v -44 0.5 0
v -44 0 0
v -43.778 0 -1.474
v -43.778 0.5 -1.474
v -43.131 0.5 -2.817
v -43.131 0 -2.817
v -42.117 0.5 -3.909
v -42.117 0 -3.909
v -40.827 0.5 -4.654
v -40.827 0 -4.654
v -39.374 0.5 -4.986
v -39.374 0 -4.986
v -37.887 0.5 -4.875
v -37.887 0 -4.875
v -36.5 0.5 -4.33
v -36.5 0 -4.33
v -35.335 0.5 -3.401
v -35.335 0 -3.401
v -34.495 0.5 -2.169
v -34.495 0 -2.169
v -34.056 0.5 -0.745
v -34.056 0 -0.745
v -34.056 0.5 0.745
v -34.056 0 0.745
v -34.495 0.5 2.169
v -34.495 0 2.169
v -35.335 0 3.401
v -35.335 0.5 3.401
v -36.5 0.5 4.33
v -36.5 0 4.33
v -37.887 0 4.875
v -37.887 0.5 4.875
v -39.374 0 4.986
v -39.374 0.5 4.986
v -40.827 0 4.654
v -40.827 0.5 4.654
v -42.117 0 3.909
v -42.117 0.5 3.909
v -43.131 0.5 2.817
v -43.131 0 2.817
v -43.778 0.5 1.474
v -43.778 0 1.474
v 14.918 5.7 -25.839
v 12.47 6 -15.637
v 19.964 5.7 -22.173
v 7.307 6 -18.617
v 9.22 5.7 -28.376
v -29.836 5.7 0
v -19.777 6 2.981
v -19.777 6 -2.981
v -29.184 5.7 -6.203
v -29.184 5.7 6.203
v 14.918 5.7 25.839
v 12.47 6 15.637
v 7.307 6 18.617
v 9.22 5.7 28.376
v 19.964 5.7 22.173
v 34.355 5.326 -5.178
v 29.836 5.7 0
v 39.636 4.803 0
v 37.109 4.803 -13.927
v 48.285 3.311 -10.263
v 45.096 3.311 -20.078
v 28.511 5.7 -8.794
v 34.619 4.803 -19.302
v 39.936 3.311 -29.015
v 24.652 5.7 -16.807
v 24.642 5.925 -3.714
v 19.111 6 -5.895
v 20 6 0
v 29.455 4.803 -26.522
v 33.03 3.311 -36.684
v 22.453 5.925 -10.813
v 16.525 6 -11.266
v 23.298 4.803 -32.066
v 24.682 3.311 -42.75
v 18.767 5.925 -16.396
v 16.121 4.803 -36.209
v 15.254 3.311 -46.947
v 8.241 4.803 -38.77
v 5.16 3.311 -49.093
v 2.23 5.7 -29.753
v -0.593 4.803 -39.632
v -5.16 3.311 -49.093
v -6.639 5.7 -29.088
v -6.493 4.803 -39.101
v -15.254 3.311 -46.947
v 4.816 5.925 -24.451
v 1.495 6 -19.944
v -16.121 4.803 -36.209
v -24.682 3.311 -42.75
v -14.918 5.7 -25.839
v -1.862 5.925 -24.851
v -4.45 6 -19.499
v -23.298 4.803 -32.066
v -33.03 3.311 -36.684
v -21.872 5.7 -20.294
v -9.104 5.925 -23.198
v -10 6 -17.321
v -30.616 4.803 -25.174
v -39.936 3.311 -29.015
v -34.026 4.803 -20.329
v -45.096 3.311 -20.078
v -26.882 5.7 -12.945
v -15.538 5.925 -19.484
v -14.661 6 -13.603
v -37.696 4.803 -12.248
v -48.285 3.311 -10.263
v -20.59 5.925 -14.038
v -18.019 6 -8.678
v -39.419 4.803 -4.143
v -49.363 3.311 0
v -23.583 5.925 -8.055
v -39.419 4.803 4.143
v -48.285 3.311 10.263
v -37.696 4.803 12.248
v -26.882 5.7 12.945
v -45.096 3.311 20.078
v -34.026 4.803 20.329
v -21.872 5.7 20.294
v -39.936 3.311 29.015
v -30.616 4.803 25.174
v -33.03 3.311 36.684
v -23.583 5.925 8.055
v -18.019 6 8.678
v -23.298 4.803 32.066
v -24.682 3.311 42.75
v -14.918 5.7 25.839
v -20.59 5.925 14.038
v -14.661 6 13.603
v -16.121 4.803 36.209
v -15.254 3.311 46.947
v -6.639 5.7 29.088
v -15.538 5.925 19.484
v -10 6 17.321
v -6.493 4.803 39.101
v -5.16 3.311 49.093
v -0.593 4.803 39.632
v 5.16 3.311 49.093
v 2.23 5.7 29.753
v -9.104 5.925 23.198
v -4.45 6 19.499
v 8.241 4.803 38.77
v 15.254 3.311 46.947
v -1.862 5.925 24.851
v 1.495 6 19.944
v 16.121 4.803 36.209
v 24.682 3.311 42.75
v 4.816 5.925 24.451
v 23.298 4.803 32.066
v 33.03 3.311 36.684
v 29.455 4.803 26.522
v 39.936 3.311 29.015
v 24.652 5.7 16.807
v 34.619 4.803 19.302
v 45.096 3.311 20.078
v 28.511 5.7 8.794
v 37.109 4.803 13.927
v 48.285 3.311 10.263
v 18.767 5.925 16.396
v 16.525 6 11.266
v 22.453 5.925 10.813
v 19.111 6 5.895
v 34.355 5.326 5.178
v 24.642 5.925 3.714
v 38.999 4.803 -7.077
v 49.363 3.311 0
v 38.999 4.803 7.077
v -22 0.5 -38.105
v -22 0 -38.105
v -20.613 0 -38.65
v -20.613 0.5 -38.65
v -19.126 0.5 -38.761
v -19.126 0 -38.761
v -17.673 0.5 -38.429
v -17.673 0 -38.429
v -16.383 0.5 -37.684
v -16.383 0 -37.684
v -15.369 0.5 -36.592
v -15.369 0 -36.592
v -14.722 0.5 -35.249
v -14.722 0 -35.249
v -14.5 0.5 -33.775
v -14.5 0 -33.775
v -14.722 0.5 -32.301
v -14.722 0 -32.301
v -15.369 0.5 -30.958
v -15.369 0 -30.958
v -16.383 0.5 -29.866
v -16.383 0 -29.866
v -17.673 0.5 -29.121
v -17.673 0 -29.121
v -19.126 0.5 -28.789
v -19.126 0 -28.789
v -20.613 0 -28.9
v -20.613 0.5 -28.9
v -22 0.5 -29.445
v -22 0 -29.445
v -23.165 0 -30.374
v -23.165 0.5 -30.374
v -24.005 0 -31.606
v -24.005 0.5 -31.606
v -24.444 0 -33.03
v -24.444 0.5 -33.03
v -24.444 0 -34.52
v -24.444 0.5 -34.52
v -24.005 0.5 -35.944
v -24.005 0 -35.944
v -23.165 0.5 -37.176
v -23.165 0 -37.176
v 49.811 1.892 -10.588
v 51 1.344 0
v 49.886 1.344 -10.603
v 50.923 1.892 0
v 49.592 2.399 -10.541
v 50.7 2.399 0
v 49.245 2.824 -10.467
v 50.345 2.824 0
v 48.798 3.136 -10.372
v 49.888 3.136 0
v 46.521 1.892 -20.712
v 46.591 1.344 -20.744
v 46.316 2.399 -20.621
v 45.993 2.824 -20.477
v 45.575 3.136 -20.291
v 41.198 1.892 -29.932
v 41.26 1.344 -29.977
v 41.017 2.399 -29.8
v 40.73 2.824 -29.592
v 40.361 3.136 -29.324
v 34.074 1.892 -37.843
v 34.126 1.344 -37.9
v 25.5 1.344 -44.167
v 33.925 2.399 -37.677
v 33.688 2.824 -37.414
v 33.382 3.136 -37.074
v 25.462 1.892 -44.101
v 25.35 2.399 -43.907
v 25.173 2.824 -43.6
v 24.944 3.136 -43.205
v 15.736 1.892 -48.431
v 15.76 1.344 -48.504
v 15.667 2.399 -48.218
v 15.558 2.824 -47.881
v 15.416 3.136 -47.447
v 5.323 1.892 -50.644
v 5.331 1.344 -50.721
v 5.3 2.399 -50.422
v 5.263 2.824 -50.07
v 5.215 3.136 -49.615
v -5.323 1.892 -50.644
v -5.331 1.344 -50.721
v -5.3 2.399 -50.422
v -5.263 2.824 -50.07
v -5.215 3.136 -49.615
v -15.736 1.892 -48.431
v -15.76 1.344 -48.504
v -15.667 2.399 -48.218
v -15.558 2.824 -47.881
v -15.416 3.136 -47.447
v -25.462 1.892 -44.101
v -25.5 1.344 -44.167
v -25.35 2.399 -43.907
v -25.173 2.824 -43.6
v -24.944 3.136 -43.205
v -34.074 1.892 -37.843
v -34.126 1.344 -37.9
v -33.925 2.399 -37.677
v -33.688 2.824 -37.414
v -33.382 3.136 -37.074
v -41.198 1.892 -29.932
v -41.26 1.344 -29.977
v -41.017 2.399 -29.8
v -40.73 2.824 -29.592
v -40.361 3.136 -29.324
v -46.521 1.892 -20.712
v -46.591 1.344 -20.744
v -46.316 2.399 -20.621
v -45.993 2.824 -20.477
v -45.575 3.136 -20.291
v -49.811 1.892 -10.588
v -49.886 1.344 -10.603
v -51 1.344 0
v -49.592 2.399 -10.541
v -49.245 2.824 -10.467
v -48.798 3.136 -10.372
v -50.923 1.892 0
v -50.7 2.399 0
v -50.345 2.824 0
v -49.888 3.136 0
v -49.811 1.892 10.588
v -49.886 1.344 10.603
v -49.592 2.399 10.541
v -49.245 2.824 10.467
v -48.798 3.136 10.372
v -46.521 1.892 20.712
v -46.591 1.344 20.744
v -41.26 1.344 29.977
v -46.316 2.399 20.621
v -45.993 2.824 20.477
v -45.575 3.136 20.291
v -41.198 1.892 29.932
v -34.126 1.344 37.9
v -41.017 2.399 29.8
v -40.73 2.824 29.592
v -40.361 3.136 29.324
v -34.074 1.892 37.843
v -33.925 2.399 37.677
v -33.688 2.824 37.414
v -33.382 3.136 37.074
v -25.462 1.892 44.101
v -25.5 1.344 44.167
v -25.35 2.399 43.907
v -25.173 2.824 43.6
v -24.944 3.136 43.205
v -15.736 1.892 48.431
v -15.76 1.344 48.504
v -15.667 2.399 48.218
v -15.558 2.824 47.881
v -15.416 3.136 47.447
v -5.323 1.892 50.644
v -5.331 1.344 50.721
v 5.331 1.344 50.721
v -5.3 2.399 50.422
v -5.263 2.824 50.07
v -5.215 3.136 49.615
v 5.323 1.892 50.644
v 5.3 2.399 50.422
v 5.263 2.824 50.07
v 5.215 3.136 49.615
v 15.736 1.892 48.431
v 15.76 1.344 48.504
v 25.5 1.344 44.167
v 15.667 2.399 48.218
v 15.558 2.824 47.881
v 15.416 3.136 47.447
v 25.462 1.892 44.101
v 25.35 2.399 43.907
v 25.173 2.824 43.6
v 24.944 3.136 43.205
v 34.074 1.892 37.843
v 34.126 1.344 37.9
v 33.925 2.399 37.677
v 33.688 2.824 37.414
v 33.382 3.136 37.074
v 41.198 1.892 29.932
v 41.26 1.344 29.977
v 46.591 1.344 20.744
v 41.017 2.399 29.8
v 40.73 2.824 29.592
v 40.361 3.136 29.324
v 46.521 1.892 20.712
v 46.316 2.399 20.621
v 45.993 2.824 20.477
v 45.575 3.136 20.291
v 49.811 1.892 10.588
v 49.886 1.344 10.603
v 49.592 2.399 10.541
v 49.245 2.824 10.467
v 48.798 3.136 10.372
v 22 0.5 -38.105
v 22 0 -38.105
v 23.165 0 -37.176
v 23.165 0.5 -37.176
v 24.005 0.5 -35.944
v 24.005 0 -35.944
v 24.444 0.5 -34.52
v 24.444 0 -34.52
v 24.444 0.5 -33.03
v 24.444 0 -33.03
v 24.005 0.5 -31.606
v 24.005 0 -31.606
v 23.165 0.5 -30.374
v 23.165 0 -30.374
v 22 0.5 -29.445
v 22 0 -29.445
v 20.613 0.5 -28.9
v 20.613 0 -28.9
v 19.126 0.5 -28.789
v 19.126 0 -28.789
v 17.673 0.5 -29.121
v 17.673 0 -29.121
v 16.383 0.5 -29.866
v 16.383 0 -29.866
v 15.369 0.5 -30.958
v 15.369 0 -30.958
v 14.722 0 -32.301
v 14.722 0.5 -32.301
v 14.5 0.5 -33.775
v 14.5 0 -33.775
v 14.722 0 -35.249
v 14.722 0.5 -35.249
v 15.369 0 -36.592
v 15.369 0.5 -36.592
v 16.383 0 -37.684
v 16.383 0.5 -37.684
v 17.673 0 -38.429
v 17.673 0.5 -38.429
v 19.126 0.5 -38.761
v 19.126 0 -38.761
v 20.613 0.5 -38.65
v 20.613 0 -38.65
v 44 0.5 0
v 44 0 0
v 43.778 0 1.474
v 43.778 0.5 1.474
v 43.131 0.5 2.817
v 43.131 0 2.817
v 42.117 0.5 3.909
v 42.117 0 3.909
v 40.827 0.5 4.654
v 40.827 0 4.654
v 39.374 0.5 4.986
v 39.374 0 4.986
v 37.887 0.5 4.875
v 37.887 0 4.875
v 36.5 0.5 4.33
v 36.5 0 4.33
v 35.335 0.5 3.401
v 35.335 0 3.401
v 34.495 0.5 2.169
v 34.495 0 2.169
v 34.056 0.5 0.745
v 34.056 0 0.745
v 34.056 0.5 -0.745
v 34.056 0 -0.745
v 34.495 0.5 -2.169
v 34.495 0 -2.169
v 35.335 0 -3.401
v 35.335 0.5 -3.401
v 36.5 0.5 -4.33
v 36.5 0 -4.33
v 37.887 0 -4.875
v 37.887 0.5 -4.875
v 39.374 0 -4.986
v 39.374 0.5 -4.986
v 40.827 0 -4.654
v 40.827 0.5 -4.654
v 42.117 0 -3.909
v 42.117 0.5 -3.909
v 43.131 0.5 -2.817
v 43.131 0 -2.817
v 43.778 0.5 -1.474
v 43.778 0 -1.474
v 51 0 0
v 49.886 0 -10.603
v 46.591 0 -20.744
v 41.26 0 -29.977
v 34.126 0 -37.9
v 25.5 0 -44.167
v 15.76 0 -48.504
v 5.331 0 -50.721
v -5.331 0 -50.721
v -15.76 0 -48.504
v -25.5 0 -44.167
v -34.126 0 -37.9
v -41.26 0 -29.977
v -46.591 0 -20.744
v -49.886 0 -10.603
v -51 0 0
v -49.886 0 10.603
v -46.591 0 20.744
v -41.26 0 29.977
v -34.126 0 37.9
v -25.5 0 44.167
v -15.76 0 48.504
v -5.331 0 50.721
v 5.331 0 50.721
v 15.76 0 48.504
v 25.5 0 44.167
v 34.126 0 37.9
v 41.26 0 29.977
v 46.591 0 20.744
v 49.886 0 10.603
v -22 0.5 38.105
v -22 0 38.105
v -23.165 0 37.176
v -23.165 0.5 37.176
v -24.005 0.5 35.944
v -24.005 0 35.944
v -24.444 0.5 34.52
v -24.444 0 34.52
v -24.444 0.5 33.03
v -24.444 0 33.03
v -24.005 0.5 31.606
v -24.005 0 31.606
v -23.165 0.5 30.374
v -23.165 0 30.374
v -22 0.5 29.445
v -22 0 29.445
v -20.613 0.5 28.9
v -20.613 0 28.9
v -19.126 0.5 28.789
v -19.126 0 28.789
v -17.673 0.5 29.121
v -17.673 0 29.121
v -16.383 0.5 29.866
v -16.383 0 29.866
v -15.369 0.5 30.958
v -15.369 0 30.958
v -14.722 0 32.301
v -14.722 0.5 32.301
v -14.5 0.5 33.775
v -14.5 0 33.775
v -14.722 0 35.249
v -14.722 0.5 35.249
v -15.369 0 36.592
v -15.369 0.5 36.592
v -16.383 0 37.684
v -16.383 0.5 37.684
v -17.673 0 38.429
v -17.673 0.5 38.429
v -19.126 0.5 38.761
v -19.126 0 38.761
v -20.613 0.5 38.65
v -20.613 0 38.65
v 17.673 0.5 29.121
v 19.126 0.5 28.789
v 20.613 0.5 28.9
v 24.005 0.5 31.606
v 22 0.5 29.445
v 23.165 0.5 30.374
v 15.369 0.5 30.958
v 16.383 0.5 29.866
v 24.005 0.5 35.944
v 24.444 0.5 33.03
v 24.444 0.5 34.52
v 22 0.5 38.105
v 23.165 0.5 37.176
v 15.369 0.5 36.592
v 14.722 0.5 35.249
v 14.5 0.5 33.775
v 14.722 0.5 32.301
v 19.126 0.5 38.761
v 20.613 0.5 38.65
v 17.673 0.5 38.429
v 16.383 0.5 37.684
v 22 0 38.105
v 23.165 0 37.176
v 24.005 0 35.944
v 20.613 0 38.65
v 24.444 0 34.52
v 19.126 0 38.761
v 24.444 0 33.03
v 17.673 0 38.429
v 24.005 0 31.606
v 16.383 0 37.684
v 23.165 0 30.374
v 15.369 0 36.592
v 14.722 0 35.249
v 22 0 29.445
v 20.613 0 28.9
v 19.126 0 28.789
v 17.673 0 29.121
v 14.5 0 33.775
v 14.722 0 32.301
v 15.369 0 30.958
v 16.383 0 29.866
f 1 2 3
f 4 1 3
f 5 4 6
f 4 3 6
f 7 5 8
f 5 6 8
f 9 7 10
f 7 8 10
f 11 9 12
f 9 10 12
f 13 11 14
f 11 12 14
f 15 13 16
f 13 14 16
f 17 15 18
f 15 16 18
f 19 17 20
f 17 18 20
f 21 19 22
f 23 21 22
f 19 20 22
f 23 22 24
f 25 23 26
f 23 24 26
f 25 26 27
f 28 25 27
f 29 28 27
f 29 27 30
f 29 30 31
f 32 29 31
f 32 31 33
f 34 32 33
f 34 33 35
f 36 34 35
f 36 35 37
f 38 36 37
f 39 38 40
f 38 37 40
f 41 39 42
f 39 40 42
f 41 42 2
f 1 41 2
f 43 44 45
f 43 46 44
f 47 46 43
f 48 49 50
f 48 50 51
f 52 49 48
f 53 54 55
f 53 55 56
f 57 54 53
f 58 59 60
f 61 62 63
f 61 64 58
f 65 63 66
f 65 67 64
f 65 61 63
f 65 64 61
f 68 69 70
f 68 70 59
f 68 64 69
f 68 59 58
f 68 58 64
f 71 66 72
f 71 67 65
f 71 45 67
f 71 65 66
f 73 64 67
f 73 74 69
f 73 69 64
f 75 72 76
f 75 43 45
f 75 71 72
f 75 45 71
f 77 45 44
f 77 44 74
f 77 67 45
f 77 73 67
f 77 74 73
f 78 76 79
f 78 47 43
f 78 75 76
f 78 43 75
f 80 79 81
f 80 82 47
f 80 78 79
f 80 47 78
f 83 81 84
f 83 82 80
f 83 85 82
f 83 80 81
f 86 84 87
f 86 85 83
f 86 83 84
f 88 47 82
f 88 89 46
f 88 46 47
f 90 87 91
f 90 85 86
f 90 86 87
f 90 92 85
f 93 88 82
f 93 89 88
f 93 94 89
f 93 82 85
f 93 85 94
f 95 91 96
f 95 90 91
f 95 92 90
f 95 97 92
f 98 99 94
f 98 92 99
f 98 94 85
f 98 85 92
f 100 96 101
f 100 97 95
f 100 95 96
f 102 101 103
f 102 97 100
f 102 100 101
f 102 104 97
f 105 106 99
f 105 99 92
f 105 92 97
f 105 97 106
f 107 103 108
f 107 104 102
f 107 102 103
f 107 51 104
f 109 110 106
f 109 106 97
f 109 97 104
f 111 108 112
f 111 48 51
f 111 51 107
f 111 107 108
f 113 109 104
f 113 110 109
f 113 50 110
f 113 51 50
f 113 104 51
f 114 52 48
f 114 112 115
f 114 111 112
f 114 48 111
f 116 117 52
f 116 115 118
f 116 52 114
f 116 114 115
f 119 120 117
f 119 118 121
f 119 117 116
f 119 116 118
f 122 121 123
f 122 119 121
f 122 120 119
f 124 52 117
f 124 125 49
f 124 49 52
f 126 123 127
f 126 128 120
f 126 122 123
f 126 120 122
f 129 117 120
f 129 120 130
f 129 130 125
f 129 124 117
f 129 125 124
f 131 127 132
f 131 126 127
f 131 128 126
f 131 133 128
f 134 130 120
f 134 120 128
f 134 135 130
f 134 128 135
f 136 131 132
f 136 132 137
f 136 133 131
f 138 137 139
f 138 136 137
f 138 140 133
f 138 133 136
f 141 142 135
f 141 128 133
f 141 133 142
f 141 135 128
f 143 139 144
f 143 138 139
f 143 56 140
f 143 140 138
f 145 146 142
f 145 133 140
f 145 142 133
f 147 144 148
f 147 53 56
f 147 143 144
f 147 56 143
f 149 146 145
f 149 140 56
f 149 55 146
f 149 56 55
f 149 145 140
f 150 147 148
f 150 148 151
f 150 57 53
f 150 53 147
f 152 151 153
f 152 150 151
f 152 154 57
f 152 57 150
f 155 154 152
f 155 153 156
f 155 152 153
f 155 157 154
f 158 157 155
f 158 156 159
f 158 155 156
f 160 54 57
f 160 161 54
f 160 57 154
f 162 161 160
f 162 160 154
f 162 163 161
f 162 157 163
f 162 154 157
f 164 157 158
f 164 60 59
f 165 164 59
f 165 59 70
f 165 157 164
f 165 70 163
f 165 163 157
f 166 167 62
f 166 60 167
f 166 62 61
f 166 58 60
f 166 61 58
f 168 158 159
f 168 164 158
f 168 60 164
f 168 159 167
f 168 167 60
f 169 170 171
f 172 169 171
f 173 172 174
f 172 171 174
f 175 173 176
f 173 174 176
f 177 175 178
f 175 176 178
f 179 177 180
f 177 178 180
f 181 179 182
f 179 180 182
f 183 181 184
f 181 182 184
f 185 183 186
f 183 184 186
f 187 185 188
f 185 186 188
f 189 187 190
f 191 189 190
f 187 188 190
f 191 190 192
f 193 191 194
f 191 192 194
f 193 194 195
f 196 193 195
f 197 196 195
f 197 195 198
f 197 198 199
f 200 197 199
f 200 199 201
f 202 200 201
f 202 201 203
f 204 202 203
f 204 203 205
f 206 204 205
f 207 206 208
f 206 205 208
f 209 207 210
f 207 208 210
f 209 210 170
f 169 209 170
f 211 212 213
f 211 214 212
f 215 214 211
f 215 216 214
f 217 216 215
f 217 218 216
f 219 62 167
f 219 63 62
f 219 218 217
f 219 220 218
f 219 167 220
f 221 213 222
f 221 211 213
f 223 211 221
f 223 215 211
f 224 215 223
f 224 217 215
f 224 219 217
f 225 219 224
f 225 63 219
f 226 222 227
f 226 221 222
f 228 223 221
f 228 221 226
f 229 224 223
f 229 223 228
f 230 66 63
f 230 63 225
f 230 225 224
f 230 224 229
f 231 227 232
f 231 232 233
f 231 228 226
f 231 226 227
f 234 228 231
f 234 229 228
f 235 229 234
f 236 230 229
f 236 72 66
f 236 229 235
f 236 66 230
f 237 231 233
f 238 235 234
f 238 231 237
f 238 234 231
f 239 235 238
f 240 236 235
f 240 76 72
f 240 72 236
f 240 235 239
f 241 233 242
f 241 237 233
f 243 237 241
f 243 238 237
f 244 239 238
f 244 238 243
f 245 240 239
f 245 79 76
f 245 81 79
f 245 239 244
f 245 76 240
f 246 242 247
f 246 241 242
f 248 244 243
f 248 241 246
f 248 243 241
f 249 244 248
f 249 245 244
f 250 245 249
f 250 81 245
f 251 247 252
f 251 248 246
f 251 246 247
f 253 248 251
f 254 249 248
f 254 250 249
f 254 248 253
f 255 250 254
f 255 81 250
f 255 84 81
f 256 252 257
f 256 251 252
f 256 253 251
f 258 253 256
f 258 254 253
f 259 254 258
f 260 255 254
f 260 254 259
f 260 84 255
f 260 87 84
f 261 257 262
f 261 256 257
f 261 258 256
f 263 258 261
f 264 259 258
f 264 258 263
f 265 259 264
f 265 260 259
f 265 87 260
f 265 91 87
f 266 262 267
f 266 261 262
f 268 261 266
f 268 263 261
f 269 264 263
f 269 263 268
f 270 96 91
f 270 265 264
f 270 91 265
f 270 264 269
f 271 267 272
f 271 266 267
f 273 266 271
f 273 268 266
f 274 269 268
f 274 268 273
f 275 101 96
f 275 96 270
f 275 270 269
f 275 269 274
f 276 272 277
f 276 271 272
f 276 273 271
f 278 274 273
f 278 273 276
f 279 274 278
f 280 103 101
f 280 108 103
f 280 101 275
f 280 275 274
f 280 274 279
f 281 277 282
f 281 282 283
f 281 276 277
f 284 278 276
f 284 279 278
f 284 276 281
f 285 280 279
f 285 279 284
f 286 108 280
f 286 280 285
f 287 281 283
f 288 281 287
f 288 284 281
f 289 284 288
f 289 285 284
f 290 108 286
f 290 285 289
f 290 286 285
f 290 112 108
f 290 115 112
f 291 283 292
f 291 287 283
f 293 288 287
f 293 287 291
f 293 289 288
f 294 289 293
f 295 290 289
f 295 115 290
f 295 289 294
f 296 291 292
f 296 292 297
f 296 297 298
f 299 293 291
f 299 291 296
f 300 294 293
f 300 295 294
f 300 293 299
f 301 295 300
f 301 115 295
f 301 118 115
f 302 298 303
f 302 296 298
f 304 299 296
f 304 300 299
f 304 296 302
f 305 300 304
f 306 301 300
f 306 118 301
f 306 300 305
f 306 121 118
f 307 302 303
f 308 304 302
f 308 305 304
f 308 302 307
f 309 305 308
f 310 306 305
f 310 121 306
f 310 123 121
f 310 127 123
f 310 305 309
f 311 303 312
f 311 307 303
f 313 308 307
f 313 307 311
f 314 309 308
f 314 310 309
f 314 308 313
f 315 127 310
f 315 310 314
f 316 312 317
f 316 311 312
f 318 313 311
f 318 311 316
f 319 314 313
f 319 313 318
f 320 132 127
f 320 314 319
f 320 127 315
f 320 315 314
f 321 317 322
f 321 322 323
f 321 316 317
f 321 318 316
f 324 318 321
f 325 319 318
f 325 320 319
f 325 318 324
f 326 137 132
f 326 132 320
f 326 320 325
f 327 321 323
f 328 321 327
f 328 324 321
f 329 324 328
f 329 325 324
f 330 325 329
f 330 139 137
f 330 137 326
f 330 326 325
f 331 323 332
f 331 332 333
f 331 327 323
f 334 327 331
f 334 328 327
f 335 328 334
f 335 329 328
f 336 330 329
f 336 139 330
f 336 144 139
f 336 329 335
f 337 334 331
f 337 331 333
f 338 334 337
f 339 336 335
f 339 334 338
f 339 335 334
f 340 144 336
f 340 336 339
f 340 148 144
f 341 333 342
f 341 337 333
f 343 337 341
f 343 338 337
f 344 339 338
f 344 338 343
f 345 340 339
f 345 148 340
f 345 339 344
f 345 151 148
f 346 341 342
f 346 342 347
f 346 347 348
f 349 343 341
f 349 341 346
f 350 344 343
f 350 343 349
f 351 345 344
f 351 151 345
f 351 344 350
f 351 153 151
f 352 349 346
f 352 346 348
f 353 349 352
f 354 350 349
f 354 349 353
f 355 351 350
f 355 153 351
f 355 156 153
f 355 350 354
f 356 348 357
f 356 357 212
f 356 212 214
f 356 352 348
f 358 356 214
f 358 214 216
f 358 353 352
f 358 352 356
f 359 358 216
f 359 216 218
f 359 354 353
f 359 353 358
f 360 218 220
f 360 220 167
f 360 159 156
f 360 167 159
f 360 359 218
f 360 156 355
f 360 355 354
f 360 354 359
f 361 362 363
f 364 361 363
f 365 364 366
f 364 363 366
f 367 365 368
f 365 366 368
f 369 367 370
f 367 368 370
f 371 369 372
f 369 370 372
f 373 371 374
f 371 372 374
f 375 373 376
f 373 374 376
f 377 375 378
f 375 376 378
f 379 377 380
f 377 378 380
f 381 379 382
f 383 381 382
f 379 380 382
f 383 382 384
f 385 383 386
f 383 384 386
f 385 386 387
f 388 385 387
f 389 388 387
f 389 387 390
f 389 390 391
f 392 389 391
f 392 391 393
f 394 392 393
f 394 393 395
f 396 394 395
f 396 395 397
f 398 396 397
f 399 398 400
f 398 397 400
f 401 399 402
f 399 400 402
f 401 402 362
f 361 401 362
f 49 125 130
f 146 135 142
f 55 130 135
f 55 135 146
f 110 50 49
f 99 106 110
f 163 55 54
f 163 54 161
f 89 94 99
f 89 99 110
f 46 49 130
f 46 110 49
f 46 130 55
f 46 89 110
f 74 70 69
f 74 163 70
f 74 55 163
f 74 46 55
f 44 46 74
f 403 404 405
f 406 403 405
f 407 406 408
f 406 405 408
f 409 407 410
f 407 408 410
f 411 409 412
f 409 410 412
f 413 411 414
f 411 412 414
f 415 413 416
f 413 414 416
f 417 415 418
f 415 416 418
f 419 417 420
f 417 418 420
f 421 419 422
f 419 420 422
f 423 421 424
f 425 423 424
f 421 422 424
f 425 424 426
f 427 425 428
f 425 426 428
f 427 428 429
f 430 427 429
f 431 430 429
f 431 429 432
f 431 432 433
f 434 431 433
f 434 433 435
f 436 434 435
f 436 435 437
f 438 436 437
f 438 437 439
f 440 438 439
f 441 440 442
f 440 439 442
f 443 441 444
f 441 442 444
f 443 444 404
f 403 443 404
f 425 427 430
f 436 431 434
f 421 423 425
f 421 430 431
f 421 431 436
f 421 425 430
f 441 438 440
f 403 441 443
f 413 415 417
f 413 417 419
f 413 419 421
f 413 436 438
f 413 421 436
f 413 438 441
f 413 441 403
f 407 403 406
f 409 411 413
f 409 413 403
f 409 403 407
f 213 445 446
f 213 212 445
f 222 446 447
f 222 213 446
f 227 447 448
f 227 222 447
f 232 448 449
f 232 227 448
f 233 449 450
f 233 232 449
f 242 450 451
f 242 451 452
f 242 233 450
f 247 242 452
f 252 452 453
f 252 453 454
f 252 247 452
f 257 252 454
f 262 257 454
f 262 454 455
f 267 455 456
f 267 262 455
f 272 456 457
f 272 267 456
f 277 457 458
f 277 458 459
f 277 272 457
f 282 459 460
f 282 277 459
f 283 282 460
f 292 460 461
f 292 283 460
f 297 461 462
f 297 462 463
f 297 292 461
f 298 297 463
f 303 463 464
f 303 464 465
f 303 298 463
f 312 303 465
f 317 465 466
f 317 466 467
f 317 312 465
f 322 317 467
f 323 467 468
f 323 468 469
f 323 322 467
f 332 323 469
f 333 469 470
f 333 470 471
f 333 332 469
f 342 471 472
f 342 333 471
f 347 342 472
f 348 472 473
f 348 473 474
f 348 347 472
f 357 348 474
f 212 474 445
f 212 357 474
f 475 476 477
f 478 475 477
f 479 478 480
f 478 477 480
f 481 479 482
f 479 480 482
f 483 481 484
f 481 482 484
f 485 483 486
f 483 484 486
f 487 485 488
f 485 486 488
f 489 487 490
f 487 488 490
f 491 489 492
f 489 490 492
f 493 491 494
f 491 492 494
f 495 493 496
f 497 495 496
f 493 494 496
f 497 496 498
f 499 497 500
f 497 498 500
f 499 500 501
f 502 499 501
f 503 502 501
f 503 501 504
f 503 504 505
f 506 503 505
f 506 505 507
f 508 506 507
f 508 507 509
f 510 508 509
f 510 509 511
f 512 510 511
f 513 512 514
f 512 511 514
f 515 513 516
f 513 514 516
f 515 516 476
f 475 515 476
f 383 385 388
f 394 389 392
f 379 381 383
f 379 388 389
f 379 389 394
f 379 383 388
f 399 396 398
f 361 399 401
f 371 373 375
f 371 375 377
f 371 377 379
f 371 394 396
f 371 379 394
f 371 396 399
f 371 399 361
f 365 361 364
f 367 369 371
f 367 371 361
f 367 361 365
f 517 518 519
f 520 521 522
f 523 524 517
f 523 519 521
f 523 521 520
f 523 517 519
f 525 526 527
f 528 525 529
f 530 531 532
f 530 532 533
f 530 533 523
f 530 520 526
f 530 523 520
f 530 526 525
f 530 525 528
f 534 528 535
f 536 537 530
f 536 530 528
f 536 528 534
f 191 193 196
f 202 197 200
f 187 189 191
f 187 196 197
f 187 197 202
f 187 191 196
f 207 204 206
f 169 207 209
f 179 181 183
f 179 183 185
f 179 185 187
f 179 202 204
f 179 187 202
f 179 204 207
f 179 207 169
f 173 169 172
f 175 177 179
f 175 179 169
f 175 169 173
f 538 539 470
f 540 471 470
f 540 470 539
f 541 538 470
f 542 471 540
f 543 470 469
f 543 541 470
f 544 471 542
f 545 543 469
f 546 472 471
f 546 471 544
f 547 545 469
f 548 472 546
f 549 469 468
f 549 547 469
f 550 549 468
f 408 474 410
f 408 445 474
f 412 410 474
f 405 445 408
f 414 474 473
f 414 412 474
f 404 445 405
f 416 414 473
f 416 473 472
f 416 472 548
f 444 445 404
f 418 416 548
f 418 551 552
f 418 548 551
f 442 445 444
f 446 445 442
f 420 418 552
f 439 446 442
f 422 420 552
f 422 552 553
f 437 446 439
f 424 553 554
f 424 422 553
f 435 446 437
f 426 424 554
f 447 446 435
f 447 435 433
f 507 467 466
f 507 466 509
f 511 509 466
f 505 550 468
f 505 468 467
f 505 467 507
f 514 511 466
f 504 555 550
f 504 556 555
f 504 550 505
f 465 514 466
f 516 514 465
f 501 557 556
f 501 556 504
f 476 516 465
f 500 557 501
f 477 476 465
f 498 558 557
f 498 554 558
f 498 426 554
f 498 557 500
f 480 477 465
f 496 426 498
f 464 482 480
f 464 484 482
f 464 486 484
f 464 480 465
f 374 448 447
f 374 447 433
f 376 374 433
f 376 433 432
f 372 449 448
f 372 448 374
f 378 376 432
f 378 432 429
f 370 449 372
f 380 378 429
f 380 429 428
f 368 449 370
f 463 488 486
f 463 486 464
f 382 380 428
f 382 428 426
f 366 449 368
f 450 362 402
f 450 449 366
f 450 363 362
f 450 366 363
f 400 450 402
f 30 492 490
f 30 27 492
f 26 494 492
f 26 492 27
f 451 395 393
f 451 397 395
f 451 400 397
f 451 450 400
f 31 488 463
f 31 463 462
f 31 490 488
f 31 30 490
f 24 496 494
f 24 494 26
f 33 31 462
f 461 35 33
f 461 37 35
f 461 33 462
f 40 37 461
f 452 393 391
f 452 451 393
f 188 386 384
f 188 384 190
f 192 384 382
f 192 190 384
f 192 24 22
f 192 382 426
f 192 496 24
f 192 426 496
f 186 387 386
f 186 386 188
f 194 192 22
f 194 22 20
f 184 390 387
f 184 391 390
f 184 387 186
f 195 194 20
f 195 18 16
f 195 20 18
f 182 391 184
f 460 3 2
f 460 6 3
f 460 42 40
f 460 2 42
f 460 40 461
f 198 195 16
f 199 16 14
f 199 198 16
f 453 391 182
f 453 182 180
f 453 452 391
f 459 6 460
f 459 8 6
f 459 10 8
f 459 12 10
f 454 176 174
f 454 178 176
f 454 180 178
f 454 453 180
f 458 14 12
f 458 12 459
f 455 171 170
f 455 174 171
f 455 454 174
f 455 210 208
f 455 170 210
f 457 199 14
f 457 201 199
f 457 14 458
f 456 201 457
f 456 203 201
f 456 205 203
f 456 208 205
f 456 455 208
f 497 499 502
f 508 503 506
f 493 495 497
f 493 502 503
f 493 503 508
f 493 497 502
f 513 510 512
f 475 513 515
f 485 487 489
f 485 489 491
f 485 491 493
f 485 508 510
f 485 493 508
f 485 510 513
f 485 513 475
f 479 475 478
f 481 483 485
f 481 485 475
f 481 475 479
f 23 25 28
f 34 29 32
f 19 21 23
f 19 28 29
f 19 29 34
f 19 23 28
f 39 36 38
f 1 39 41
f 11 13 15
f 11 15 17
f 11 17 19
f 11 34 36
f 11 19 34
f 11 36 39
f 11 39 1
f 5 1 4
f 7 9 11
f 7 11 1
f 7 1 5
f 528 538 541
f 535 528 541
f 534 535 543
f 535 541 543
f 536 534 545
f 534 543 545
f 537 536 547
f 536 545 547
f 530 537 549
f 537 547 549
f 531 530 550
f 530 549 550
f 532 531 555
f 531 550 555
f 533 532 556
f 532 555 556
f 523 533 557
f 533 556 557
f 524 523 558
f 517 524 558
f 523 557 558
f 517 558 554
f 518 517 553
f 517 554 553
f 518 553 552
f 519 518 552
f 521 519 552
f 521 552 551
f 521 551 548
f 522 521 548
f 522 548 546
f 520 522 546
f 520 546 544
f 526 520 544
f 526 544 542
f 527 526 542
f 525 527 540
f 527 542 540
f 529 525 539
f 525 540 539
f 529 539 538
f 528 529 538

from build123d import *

# Parameters (mm, degrees)
F2_R            = 5
F3_DEPTH        = 0.5
F3_COPIES_COUNT = 6


# Not quite as in the source:
# - a pattern or mirror of a feature is missing from the dataset's text; its kind, count and spacing are read off the source's solid


with BuildPart() as f1:
    # F0 (on Top) → F1 (revolve)
    with BuildSketch(Plane.XY):
        with BuildLine():
            Line((0, 6), (0, 0))
            Line((0, 0), (51, 0))
            Line((51, 0), (51, 1.3443025184))
            ThreePointArc((51, 1.3443025184), (50.5372887774, 2.6236551731), (49.363256785, 3.3110369967))
            ThreePointArc((49.363256785, 3.3110369967), (34.7430608343, 5.3263557546), (20, 6))
            Line((20, 6), (0, 6))
        make_face()
    revolve(axis=Axis((0, 3, 0), (0, 1, 0)))

    # F2 (on face) → F3 (cut)
    with BuildSketch(Plane.XZ):
        with Locations((39, 0)):
            Circle(F2_R)
    f3 = extrude(amount=-F3_DEPTH, mode=Mode.SUBTRACT)

    # F3_copies: F3 ×6 about axis
    f3_copies_axis = Axis((0, 0, 0), (0, 1, 0))
    for i in range(1, F3_COPIES_COUNT):
        add(f3.rotate(f3_copies_axis, i * 360 / F3_COPIES_COUNT), mode=Mode.SUBTRACT)


solid = f1.part
